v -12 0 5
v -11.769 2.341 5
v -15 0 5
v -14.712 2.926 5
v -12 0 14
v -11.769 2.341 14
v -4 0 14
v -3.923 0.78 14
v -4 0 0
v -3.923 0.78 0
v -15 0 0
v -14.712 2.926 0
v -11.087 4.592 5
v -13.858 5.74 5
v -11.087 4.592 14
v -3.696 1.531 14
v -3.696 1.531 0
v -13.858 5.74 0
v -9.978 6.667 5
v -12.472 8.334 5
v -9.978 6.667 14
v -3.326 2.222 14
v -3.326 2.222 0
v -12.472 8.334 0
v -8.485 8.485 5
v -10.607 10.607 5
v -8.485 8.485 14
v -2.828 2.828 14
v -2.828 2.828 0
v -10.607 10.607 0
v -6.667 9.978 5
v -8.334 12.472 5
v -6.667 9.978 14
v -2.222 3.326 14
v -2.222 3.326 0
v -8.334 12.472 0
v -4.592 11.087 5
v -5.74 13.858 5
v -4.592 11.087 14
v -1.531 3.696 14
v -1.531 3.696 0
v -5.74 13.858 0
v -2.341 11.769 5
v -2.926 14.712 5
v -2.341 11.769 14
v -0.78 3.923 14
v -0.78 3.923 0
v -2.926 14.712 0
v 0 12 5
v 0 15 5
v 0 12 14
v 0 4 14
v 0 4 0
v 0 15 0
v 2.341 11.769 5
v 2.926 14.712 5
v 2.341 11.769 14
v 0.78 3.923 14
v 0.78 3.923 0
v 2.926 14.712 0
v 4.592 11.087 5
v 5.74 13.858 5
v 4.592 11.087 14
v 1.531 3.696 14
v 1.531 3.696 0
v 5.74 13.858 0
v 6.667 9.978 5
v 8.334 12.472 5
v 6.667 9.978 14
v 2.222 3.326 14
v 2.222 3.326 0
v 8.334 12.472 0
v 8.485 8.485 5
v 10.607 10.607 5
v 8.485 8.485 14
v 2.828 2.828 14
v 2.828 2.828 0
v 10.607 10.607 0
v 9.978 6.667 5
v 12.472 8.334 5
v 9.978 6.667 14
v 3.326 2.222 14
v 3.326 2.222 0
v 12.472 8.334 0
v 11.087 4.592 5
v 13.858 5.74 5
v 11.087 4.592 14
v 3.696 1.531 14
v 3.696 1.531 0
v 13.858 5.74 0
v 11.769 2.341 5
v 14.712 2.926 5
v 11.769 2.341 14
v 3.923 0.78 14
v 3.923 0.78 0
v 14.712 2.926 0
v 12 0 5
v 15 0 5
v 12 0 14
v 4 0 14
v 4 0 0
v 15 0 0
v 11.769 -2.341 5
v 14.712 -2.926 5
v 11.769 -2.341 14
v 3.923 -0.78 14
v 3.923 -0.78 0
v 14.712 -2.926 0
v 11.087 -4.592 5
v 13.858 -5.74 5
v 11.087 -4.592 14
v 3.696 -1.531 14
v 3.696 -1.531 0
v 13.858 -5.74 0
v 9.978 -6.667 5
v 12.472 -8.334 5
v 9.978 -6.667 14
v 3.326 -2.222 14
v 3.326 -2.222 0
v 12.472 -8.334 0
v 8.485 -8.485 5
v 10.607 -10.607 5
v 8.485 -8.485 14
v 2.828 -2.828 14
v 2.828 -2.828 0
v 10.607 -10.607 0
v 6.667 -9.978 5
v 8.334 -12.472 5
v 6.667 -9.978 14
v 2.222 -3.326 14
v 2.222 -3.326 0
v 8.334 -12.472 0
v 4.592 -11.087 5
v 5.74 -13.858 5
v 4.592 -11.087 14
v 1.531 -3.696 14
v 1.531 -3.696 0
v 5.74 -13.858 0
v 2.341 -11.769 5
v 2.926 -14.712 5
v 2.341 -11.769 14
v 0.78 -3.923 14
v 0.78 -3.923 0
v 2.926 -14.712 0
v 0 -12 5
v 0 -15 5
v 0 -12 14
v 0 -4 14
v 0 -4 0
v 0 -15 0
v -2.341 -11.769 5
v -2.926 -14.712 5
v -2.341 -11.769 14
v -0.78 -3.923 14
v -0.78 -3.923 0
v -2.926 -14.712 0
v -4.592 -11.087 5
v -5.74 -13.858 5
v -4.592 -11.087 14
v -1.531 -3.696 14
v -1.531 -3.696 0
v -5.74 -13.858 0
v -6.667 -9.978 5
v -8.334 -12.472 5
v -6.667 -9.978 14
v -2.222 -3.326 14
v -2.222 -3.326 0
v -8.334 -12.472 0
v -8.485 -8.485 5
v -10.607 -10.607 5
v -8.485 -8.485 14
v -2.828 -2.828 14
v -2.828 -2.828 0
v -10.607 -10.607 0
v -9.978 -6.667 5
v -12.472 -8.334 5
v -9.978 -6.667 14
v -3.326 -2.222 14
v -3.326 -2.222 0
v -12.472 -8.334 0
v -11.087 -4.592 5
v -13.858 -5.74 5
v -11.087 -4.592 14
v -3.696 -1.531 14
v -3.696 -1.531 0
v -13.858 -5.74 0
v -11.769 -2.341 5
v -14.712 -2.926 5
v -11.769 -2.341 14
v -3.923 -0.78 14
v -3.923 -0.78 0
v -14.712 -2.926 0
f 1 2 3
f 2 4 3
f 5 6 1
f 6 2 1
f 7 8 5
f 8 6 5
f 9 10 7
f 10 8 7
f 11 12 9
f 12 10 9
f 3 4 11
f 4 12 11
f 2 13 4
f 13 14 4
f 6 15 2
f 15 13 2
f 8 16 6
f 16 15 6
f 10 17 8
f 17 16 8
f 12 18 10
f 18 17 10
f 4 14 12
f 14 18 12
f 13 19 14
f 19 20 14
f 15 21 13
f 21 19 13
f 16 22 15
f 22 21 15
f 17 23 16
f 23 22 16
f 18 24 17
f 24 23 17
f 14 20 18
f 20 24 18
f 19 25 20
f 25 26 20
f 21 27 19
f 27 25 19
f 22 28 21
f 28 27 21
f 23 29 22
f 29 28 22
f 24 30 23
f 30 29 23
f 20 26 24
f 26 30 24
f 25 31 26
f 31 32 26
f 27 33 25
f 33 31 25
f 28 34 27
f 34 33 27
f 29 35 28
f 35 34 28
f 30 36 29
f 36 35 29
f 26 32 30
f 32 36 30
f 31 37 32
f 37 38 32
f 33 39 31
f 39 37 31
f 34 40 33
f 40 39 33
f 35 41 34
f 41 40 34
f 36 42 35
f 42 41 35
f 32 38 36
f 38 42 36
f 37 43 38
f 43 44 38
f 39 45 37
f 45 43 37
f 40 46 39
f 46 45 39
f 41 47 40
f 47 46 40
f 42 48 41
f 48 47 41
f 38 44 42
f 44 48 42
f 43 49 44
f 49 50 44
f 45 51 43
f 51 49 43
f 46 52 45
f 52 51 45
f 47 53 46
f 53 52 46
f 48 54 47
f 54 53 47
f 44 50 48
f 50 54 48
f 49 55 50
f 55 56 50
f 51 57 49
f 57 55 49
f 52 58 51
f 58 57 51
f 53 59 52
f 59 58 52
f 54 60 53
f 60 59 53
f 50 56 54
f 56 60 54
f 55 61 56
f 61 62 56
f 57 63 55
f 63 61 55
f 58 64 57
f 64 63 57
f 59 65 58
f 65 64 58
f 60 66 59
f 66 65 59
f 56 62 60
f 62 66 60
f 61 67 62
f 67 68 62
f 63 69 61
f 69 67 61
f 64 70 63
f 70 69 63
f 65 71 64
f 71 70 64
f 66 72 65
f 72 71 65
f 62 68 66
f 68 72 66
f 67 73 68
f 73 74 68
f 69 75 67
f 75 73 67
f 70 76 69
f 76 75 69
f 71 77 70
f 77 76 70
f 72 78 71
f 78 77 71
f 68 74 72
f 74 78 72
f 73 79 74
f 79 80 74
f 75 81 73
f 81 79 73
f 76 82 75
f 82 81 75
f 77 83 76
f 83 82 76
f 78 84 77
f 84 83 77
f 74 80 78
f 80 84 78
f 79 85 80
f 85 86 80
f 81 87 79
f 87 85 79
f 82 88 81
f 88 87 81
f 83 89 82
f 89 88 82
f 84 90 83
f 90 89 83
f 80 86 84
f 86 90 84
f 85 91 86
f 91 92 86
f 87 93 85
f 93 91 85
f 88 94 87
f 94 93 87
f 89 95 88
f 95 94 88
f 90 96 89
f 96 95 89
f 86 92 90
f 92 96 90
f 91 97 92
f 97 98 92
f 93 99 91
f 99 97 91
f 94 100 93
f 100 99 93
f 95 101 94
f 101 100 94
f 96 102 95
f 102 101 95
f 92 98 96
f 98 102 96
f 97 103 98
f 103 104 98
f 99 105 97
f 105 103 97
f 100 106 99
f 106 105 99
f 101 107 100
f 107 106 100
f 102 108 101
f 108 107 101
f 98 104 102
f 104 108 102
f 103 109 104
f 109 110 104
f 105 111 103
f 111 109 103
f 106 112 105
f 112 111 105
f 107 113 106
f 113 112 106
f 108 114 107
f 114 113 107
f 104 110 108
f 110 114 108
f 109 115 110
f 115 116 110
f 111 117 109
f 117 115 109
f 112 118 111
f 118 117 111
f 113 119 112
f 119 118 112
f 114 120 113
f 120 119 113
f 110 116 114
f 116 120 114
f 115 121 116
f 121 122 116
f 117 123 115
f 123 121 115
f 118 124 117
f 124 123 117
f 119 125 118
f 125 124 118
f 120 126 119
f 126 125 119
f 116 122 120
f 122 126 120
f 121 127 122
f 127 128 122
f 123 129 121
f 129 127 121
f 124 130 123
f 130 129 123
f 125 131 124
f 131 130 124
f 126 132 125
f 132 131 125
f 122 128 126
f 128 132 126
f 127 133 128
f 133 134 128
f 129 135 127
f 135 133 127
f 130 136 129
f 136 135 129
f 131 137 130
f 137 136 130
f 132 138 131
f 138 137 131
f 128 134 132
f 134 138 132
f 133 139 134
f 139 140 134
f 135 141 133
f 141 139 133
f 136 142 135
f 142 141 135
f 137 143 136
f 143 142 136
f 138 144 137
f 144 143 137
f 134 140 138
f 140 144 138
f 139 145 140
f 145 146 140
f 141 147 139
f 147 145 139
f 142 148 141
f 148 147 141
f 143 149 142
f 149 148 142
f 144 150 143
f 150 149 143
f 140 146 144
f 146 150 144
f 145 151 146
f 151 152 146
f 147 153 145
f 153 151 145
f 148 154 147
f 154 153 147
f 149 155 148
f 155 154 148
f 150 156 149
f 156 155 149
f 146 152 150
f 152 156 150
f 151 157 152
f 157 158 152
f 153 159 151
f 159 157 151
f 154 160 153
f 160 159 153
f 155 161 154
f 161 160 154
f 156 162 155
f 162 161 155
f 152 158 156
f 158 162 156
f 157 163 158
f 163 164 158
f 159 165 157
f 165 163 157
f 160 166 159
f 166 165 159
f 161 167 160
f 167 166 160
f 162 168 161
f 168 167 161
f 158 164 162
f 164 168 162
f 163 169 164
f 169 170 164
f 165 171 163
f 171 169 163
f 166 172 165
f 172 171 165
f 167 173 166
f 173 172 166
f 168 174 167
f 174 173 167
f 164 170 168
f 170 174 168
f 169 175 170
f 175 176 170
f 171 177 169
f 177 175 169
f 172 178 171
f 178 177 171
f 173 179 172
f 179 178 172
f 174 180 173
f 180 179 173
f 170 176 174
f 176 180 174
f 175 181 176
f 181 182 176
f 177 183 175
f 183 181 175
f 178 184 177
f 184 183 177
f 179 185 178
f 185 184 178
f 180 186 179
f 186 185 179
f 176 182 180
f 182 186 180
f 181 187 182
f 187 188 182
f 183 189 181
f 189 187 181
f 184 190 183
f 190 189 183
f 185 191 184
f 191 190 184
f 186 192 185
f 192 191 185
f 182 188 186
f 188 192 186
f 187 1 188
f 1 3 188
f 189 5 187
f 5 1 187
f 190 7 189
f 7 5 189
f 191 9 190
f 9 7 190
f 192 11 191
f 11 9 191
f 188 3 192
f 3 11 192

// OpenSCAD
$fn = 32;

// ----------------------------------------------------------------------
// Arc stop: collar, 14 mm thick
// ----------------------------------------------------------------------

// --- parameters (mm) ---
revolve_angle = 360;      // full turn around the Z axis
profile_points = 6;       // points of the closed outline

profile = [[4, 0], [15, 0], [15, 5], [12, 5], [12, 14], [4, 14]];  // single closed polygon, 6 points, counter clockwise

// --- the one profile operation ---
rotate_extrude(angle = revolve_angle) polygon(points = profile);
